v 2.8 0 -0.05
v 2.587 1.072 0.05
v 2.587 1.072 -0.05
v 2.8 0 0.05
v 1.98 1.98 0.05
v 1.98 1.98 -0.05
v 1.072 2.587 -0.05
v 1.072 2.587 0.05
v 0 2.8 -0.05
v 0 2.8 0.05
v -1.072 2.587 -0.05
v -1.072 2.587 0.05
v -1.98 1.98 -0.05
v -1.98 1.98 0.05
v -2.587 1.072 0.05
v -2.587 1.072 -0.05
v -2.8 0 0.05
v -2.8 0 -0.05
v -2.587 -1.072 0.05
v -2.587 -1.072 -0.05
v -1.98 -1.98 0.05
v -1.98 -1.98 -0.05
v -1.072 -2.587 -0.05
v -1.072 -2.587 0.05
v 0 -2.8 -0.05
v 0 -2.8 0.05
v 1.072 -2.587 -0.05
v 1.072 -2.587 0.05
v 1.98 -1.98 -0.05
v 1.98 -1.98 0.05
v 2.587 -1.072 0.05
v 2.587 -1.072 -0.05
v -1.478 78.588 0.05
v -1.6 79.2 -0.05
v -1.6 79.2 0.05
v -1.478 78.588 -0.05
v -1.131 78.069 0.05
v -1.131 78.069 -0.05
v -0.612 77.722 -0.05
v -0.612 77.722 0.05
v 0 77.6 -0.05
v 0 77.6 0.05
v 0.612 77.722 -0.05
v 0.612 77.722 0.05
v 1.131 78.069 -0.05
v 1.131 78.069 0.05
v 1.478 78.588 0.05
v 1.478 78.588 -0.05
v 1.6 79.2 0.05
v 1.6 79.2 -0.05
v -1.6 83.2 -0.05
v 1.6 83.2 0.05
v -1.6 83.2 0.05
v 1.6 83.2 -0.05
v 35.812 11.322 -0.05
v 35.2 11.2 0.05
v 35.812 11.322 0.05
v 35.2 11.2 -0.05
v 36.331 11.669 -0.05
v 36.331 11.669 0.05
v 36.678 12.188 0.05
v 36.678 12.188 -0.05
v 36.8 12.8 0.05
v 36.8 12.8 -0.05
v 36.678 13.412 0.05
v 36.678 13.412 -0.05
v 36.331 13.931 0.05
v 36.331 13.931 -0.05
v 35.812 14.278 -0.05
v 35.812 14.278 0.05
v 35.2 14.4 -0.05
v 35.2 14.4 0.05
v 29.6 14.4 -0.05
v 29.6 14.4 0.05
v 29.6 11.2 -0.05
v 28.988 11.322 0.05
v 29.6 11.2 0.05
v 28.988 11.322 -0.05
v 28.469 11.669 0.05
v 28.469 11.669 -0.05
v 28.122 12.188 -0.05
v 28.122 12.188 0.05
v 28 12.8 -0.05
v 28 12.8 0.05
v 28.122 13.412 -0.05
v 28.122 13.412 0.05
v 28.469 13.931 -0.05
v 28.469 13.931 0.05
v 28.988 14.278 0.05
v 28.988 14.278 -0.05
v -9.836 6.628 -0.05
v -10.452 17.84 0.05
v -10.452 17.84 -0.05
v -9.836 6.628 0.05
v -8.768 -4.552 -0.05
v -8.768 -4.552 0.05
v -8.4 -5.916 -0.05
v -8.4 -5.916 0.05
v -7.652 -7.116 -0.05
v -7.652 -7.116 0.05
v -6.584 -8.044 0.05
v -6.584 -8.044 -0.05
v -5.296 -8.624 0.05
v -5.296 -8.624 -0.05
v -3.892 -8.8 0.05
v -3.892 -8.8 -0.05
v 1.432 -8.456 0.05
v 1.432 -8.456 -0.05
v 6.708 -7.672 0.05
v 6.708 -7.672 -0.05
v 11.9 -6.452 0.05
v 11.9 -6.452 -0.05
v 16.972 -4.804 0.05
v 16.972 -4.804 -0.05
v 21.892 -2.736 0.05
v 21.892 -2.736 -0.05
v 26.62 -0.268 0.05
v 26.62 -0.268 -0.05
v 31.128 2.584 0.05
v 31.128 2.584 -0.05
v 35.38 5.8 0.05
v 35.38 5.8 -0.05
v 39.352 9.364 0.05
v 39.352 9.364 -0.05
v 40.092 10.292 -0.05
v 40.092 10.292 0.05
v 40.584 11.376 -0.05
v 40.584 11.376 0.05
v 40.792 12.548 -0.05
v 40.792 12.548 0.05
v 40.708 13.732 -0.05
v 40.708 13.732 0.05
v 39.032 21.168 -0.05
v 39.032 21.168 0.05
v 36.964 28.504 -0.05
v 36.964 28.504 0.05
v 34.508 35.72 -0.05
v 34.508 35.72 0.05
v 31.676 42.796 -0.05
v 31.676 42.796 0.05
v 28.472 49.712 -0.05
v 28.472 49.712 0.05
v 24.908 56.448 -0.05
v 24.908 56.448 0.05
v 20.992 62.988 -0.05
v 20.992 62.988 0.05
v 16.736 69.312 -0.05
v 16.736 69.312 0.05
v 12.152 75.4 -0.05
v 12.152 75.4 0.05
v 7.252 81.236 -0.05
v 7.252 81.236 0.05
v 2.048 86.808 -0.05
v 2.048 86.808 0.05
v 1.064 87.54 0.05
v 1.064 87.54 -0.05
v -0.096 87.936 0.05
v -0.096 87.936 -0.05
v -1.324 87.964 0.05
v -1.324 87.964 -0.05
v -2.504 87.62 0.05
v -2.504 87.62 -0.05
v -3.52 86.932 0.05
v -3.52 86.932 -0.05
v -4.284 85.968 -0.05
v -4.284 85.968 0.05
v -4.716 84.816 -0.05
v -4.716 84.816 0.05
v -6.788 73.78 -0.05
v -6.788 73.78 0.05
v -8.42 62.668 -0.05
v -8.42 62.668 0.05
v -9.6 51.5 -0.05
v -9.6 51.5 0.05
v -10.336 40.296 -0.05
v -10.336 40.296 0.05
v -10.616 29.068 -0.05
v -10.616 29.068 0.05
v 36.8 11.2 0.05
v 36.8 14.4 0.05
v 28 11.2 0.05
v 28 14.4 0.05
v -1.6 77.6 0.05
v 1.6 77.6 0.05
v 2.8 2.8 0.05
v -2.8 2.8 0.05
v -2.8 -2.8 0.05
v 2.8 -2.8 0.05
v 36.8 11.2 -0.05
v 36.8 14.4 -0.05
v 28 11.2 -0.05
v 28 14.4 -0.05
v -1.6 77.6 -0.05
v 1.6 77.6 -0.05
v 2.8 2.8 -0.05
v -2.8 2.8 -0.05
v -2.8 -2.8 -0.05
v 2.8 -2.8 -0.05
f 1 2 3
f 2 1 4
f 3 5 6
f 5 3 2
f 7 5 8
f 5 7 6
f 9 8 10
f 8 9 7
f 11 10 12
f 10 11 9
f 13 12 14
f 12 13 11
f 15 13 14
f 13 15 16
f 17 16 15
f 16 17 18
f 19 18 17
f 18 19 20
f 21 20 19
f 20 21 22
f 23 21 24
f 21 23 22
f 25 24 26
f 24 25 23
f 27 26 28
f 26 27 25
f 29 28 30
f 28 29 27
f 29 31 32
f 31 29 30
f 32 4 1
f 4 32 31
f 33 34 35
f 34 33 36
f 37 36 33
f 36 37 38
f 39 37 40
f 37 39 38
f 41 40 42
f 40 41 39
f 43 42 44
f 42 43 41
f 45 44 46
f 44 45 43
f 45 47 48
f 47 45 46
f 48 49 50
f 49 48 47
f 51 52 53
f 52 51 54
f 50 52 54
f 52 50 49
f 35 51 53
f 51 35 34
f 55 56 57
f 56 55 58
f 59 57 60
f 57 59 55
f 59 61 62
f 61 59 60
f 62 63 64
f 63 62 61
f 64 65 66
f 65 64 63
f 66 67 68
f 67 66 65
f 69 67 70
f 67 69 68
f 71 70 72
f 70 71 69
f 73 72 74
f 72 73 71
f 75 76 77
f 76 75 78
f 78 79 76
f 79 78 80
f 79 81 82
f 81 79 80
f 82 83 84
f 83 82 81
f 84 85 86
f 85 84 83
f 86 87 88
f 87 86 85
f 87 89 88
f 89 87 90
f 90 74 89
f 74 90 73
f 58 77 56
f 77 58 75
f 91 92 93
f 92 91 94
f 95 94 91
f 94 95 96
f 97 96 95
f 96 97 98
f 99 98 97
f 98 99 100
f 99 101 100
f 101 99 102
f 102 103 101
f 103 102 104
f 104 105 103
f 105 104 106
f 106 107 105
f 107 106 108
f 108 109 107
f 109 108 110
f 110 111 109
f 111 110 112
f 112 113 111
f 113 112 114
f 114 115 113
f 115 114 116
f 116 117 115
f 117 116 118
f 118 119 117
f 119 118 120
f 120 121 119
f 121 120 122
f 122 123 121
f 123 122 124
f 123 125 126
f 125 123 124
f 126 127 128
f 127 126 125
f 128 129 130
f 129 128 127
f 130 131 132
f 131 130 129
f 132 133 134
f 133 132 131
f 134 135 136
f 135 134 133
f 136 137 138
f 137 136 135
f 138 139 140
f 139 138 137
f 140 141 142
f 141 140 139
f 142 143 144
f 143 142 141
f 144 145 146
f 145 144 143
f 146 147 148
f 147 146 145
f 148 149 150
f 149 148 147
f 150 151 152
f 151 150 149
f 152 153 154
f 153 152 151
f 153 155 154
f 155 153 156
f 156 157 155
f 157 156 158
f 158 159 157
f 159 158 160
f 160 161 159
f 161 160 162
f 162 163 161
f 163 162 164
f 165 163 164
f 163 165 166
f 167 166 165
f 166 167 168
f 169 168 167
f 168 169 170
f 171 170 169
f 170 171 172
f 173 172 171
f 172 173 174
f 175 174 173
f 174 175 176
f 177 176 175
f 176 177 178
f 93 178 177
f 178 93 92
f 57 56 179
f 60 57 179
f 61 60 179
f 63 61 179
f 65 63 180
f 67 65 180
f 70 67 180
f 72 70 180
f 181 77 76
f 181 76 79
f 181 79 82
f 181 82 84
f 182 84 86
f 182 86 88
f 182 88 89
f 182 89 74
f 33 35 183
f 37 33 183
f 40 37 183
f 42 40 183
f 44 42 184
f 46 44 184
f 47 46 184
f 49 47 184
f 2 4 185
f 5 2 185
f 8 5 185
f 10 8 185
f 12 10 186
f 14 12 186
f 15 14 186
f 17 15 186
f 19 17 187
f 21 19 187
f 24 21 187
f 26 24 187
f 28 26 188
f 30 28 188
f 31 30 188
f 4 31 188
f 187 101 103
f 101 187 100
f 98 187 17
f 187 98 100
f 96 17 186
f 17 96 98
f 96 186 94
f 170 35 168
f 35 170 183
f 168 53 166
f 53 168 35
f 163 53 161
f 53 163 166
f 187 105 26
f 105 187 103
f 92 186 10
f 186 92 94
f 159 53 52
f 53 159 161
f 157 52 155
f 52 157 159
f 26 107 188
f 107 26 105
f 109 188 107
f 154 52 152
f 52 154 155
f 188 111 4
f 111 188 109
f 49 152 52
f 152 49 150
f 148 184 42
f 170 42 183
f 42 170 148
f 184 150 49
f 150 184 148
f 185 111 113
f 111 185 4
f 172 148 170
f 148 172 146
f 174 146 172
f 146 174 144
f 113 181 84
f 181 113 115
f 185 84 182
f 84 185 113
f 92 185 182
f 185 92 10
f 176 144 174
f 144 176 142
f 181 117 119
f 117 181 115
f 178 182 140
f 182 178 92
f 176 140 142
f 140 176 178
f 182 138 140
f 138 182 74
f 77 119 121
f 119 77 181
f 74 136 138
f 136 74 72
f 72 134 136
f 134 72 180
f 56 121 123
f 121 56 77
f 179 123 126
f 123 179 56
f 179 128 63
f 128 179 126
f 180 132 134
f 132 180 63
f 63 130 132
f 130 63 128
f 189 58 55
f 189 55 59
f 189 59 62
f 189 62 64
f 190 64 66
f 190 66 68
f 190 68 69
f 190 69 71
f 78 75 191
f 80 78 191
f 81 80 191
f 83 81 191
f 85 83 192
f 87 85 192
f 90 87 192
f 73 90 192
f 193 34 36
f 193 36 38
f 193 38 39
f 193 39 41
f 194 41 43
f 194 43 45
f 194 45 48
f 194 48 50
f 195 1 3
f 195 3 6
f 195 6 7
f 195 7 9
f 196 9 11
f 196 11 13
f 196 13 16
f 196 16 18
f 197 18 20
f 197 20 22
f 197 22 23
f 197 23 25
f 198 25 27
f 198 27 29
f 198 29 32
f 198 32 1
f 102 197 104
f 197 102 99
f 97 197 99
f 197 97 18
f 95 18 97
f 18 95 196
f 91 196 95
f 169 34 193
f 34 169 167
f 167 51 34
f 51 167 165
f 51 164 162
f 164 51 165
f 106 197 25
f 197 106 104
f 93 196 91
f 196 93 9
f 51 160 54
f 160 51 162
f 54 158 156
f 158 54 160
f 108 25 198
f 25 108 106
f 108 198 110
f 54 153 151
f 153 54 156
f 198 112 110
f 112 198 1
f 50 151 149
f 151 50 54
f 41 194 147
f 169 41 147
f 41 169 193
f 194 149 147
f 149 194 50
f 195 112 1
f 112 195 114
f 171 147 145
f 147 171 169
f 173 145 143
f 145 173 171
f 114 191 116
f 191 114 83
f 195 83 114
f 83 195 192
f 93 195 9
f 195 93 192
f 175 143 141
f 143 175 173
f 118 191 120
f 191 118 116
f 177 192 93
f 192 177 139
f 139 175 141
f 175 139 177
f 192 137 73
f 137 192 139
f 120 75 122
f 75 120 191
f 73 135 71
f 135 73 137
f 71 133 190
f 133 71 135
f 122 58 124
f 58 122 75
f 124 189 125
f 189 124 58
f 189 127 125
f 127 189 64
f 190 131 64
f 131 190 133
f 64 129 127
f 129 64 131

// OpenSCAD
use <../lib.scad>
use <s/u66s01.scad>
use <s/u66s02.scad>
function ldraw_lib__u66() = [
// 0 Sheet Plastic  6 x 12 Triangular
// 0 Name: u66.dat
// 0 Author: Damien Roux [Darats]
// 0 !LDRAW_ORG Part UPDATE 2019-01
// 0 !LICENSE Licensed under CC BY 4.0 : see CAreadme.txt
// 
// 0 BFC CERTIFY CCW
  [0,"BFC","CERTIFY"],
  [0,"BFC","CCW"],
// 
// 0 !CATEGORY Sheet Plastic
// 
// 0 !HISTORY 2015-12-30 [PTadmin] Official Update 2015-02
// 0 !HISTORY 2019-01-25 [cwdee] Set new category
// 0 !HISTORY 2019-06-28 [PTadmin] Official Update 2019-01
// 
// 
// 1 16 0 0 0 1 0 0 0 1 0 0 0 1 s\u66s01.dat
  [1,16,0,0,0,1,0,0,0,1,0,0,0,1, ldraw_lib__s__u66s01()],
// 1 16 0 -0.125 0 1 0 0 0 1 0 0 0 1 s\u66s02.dat
  [1,16,0,-0.125,0,1,0,0,0,1,0,0,0,1, ldraw_lib__s__u66s02()],
// 1 16 0 0.125 0 1 0 0 0 -1 0 0 0 1 s\u66s02.dat
  [1,16,0,0.125,0,1,0,0,0,-1,0,0,0,1, ldraw_lib__s__u66s02()],
];
module ldraw_lib__u66(step=0, col=false, unit=2/5, alt=false, line=0.2, solid=!$preview)
    makepoly(ldraw_lib__u66(), step=step, col=col, unit=unit, alt=alt, line=line, solid=solid);
ldraw_lib__u66(line=0.2);
